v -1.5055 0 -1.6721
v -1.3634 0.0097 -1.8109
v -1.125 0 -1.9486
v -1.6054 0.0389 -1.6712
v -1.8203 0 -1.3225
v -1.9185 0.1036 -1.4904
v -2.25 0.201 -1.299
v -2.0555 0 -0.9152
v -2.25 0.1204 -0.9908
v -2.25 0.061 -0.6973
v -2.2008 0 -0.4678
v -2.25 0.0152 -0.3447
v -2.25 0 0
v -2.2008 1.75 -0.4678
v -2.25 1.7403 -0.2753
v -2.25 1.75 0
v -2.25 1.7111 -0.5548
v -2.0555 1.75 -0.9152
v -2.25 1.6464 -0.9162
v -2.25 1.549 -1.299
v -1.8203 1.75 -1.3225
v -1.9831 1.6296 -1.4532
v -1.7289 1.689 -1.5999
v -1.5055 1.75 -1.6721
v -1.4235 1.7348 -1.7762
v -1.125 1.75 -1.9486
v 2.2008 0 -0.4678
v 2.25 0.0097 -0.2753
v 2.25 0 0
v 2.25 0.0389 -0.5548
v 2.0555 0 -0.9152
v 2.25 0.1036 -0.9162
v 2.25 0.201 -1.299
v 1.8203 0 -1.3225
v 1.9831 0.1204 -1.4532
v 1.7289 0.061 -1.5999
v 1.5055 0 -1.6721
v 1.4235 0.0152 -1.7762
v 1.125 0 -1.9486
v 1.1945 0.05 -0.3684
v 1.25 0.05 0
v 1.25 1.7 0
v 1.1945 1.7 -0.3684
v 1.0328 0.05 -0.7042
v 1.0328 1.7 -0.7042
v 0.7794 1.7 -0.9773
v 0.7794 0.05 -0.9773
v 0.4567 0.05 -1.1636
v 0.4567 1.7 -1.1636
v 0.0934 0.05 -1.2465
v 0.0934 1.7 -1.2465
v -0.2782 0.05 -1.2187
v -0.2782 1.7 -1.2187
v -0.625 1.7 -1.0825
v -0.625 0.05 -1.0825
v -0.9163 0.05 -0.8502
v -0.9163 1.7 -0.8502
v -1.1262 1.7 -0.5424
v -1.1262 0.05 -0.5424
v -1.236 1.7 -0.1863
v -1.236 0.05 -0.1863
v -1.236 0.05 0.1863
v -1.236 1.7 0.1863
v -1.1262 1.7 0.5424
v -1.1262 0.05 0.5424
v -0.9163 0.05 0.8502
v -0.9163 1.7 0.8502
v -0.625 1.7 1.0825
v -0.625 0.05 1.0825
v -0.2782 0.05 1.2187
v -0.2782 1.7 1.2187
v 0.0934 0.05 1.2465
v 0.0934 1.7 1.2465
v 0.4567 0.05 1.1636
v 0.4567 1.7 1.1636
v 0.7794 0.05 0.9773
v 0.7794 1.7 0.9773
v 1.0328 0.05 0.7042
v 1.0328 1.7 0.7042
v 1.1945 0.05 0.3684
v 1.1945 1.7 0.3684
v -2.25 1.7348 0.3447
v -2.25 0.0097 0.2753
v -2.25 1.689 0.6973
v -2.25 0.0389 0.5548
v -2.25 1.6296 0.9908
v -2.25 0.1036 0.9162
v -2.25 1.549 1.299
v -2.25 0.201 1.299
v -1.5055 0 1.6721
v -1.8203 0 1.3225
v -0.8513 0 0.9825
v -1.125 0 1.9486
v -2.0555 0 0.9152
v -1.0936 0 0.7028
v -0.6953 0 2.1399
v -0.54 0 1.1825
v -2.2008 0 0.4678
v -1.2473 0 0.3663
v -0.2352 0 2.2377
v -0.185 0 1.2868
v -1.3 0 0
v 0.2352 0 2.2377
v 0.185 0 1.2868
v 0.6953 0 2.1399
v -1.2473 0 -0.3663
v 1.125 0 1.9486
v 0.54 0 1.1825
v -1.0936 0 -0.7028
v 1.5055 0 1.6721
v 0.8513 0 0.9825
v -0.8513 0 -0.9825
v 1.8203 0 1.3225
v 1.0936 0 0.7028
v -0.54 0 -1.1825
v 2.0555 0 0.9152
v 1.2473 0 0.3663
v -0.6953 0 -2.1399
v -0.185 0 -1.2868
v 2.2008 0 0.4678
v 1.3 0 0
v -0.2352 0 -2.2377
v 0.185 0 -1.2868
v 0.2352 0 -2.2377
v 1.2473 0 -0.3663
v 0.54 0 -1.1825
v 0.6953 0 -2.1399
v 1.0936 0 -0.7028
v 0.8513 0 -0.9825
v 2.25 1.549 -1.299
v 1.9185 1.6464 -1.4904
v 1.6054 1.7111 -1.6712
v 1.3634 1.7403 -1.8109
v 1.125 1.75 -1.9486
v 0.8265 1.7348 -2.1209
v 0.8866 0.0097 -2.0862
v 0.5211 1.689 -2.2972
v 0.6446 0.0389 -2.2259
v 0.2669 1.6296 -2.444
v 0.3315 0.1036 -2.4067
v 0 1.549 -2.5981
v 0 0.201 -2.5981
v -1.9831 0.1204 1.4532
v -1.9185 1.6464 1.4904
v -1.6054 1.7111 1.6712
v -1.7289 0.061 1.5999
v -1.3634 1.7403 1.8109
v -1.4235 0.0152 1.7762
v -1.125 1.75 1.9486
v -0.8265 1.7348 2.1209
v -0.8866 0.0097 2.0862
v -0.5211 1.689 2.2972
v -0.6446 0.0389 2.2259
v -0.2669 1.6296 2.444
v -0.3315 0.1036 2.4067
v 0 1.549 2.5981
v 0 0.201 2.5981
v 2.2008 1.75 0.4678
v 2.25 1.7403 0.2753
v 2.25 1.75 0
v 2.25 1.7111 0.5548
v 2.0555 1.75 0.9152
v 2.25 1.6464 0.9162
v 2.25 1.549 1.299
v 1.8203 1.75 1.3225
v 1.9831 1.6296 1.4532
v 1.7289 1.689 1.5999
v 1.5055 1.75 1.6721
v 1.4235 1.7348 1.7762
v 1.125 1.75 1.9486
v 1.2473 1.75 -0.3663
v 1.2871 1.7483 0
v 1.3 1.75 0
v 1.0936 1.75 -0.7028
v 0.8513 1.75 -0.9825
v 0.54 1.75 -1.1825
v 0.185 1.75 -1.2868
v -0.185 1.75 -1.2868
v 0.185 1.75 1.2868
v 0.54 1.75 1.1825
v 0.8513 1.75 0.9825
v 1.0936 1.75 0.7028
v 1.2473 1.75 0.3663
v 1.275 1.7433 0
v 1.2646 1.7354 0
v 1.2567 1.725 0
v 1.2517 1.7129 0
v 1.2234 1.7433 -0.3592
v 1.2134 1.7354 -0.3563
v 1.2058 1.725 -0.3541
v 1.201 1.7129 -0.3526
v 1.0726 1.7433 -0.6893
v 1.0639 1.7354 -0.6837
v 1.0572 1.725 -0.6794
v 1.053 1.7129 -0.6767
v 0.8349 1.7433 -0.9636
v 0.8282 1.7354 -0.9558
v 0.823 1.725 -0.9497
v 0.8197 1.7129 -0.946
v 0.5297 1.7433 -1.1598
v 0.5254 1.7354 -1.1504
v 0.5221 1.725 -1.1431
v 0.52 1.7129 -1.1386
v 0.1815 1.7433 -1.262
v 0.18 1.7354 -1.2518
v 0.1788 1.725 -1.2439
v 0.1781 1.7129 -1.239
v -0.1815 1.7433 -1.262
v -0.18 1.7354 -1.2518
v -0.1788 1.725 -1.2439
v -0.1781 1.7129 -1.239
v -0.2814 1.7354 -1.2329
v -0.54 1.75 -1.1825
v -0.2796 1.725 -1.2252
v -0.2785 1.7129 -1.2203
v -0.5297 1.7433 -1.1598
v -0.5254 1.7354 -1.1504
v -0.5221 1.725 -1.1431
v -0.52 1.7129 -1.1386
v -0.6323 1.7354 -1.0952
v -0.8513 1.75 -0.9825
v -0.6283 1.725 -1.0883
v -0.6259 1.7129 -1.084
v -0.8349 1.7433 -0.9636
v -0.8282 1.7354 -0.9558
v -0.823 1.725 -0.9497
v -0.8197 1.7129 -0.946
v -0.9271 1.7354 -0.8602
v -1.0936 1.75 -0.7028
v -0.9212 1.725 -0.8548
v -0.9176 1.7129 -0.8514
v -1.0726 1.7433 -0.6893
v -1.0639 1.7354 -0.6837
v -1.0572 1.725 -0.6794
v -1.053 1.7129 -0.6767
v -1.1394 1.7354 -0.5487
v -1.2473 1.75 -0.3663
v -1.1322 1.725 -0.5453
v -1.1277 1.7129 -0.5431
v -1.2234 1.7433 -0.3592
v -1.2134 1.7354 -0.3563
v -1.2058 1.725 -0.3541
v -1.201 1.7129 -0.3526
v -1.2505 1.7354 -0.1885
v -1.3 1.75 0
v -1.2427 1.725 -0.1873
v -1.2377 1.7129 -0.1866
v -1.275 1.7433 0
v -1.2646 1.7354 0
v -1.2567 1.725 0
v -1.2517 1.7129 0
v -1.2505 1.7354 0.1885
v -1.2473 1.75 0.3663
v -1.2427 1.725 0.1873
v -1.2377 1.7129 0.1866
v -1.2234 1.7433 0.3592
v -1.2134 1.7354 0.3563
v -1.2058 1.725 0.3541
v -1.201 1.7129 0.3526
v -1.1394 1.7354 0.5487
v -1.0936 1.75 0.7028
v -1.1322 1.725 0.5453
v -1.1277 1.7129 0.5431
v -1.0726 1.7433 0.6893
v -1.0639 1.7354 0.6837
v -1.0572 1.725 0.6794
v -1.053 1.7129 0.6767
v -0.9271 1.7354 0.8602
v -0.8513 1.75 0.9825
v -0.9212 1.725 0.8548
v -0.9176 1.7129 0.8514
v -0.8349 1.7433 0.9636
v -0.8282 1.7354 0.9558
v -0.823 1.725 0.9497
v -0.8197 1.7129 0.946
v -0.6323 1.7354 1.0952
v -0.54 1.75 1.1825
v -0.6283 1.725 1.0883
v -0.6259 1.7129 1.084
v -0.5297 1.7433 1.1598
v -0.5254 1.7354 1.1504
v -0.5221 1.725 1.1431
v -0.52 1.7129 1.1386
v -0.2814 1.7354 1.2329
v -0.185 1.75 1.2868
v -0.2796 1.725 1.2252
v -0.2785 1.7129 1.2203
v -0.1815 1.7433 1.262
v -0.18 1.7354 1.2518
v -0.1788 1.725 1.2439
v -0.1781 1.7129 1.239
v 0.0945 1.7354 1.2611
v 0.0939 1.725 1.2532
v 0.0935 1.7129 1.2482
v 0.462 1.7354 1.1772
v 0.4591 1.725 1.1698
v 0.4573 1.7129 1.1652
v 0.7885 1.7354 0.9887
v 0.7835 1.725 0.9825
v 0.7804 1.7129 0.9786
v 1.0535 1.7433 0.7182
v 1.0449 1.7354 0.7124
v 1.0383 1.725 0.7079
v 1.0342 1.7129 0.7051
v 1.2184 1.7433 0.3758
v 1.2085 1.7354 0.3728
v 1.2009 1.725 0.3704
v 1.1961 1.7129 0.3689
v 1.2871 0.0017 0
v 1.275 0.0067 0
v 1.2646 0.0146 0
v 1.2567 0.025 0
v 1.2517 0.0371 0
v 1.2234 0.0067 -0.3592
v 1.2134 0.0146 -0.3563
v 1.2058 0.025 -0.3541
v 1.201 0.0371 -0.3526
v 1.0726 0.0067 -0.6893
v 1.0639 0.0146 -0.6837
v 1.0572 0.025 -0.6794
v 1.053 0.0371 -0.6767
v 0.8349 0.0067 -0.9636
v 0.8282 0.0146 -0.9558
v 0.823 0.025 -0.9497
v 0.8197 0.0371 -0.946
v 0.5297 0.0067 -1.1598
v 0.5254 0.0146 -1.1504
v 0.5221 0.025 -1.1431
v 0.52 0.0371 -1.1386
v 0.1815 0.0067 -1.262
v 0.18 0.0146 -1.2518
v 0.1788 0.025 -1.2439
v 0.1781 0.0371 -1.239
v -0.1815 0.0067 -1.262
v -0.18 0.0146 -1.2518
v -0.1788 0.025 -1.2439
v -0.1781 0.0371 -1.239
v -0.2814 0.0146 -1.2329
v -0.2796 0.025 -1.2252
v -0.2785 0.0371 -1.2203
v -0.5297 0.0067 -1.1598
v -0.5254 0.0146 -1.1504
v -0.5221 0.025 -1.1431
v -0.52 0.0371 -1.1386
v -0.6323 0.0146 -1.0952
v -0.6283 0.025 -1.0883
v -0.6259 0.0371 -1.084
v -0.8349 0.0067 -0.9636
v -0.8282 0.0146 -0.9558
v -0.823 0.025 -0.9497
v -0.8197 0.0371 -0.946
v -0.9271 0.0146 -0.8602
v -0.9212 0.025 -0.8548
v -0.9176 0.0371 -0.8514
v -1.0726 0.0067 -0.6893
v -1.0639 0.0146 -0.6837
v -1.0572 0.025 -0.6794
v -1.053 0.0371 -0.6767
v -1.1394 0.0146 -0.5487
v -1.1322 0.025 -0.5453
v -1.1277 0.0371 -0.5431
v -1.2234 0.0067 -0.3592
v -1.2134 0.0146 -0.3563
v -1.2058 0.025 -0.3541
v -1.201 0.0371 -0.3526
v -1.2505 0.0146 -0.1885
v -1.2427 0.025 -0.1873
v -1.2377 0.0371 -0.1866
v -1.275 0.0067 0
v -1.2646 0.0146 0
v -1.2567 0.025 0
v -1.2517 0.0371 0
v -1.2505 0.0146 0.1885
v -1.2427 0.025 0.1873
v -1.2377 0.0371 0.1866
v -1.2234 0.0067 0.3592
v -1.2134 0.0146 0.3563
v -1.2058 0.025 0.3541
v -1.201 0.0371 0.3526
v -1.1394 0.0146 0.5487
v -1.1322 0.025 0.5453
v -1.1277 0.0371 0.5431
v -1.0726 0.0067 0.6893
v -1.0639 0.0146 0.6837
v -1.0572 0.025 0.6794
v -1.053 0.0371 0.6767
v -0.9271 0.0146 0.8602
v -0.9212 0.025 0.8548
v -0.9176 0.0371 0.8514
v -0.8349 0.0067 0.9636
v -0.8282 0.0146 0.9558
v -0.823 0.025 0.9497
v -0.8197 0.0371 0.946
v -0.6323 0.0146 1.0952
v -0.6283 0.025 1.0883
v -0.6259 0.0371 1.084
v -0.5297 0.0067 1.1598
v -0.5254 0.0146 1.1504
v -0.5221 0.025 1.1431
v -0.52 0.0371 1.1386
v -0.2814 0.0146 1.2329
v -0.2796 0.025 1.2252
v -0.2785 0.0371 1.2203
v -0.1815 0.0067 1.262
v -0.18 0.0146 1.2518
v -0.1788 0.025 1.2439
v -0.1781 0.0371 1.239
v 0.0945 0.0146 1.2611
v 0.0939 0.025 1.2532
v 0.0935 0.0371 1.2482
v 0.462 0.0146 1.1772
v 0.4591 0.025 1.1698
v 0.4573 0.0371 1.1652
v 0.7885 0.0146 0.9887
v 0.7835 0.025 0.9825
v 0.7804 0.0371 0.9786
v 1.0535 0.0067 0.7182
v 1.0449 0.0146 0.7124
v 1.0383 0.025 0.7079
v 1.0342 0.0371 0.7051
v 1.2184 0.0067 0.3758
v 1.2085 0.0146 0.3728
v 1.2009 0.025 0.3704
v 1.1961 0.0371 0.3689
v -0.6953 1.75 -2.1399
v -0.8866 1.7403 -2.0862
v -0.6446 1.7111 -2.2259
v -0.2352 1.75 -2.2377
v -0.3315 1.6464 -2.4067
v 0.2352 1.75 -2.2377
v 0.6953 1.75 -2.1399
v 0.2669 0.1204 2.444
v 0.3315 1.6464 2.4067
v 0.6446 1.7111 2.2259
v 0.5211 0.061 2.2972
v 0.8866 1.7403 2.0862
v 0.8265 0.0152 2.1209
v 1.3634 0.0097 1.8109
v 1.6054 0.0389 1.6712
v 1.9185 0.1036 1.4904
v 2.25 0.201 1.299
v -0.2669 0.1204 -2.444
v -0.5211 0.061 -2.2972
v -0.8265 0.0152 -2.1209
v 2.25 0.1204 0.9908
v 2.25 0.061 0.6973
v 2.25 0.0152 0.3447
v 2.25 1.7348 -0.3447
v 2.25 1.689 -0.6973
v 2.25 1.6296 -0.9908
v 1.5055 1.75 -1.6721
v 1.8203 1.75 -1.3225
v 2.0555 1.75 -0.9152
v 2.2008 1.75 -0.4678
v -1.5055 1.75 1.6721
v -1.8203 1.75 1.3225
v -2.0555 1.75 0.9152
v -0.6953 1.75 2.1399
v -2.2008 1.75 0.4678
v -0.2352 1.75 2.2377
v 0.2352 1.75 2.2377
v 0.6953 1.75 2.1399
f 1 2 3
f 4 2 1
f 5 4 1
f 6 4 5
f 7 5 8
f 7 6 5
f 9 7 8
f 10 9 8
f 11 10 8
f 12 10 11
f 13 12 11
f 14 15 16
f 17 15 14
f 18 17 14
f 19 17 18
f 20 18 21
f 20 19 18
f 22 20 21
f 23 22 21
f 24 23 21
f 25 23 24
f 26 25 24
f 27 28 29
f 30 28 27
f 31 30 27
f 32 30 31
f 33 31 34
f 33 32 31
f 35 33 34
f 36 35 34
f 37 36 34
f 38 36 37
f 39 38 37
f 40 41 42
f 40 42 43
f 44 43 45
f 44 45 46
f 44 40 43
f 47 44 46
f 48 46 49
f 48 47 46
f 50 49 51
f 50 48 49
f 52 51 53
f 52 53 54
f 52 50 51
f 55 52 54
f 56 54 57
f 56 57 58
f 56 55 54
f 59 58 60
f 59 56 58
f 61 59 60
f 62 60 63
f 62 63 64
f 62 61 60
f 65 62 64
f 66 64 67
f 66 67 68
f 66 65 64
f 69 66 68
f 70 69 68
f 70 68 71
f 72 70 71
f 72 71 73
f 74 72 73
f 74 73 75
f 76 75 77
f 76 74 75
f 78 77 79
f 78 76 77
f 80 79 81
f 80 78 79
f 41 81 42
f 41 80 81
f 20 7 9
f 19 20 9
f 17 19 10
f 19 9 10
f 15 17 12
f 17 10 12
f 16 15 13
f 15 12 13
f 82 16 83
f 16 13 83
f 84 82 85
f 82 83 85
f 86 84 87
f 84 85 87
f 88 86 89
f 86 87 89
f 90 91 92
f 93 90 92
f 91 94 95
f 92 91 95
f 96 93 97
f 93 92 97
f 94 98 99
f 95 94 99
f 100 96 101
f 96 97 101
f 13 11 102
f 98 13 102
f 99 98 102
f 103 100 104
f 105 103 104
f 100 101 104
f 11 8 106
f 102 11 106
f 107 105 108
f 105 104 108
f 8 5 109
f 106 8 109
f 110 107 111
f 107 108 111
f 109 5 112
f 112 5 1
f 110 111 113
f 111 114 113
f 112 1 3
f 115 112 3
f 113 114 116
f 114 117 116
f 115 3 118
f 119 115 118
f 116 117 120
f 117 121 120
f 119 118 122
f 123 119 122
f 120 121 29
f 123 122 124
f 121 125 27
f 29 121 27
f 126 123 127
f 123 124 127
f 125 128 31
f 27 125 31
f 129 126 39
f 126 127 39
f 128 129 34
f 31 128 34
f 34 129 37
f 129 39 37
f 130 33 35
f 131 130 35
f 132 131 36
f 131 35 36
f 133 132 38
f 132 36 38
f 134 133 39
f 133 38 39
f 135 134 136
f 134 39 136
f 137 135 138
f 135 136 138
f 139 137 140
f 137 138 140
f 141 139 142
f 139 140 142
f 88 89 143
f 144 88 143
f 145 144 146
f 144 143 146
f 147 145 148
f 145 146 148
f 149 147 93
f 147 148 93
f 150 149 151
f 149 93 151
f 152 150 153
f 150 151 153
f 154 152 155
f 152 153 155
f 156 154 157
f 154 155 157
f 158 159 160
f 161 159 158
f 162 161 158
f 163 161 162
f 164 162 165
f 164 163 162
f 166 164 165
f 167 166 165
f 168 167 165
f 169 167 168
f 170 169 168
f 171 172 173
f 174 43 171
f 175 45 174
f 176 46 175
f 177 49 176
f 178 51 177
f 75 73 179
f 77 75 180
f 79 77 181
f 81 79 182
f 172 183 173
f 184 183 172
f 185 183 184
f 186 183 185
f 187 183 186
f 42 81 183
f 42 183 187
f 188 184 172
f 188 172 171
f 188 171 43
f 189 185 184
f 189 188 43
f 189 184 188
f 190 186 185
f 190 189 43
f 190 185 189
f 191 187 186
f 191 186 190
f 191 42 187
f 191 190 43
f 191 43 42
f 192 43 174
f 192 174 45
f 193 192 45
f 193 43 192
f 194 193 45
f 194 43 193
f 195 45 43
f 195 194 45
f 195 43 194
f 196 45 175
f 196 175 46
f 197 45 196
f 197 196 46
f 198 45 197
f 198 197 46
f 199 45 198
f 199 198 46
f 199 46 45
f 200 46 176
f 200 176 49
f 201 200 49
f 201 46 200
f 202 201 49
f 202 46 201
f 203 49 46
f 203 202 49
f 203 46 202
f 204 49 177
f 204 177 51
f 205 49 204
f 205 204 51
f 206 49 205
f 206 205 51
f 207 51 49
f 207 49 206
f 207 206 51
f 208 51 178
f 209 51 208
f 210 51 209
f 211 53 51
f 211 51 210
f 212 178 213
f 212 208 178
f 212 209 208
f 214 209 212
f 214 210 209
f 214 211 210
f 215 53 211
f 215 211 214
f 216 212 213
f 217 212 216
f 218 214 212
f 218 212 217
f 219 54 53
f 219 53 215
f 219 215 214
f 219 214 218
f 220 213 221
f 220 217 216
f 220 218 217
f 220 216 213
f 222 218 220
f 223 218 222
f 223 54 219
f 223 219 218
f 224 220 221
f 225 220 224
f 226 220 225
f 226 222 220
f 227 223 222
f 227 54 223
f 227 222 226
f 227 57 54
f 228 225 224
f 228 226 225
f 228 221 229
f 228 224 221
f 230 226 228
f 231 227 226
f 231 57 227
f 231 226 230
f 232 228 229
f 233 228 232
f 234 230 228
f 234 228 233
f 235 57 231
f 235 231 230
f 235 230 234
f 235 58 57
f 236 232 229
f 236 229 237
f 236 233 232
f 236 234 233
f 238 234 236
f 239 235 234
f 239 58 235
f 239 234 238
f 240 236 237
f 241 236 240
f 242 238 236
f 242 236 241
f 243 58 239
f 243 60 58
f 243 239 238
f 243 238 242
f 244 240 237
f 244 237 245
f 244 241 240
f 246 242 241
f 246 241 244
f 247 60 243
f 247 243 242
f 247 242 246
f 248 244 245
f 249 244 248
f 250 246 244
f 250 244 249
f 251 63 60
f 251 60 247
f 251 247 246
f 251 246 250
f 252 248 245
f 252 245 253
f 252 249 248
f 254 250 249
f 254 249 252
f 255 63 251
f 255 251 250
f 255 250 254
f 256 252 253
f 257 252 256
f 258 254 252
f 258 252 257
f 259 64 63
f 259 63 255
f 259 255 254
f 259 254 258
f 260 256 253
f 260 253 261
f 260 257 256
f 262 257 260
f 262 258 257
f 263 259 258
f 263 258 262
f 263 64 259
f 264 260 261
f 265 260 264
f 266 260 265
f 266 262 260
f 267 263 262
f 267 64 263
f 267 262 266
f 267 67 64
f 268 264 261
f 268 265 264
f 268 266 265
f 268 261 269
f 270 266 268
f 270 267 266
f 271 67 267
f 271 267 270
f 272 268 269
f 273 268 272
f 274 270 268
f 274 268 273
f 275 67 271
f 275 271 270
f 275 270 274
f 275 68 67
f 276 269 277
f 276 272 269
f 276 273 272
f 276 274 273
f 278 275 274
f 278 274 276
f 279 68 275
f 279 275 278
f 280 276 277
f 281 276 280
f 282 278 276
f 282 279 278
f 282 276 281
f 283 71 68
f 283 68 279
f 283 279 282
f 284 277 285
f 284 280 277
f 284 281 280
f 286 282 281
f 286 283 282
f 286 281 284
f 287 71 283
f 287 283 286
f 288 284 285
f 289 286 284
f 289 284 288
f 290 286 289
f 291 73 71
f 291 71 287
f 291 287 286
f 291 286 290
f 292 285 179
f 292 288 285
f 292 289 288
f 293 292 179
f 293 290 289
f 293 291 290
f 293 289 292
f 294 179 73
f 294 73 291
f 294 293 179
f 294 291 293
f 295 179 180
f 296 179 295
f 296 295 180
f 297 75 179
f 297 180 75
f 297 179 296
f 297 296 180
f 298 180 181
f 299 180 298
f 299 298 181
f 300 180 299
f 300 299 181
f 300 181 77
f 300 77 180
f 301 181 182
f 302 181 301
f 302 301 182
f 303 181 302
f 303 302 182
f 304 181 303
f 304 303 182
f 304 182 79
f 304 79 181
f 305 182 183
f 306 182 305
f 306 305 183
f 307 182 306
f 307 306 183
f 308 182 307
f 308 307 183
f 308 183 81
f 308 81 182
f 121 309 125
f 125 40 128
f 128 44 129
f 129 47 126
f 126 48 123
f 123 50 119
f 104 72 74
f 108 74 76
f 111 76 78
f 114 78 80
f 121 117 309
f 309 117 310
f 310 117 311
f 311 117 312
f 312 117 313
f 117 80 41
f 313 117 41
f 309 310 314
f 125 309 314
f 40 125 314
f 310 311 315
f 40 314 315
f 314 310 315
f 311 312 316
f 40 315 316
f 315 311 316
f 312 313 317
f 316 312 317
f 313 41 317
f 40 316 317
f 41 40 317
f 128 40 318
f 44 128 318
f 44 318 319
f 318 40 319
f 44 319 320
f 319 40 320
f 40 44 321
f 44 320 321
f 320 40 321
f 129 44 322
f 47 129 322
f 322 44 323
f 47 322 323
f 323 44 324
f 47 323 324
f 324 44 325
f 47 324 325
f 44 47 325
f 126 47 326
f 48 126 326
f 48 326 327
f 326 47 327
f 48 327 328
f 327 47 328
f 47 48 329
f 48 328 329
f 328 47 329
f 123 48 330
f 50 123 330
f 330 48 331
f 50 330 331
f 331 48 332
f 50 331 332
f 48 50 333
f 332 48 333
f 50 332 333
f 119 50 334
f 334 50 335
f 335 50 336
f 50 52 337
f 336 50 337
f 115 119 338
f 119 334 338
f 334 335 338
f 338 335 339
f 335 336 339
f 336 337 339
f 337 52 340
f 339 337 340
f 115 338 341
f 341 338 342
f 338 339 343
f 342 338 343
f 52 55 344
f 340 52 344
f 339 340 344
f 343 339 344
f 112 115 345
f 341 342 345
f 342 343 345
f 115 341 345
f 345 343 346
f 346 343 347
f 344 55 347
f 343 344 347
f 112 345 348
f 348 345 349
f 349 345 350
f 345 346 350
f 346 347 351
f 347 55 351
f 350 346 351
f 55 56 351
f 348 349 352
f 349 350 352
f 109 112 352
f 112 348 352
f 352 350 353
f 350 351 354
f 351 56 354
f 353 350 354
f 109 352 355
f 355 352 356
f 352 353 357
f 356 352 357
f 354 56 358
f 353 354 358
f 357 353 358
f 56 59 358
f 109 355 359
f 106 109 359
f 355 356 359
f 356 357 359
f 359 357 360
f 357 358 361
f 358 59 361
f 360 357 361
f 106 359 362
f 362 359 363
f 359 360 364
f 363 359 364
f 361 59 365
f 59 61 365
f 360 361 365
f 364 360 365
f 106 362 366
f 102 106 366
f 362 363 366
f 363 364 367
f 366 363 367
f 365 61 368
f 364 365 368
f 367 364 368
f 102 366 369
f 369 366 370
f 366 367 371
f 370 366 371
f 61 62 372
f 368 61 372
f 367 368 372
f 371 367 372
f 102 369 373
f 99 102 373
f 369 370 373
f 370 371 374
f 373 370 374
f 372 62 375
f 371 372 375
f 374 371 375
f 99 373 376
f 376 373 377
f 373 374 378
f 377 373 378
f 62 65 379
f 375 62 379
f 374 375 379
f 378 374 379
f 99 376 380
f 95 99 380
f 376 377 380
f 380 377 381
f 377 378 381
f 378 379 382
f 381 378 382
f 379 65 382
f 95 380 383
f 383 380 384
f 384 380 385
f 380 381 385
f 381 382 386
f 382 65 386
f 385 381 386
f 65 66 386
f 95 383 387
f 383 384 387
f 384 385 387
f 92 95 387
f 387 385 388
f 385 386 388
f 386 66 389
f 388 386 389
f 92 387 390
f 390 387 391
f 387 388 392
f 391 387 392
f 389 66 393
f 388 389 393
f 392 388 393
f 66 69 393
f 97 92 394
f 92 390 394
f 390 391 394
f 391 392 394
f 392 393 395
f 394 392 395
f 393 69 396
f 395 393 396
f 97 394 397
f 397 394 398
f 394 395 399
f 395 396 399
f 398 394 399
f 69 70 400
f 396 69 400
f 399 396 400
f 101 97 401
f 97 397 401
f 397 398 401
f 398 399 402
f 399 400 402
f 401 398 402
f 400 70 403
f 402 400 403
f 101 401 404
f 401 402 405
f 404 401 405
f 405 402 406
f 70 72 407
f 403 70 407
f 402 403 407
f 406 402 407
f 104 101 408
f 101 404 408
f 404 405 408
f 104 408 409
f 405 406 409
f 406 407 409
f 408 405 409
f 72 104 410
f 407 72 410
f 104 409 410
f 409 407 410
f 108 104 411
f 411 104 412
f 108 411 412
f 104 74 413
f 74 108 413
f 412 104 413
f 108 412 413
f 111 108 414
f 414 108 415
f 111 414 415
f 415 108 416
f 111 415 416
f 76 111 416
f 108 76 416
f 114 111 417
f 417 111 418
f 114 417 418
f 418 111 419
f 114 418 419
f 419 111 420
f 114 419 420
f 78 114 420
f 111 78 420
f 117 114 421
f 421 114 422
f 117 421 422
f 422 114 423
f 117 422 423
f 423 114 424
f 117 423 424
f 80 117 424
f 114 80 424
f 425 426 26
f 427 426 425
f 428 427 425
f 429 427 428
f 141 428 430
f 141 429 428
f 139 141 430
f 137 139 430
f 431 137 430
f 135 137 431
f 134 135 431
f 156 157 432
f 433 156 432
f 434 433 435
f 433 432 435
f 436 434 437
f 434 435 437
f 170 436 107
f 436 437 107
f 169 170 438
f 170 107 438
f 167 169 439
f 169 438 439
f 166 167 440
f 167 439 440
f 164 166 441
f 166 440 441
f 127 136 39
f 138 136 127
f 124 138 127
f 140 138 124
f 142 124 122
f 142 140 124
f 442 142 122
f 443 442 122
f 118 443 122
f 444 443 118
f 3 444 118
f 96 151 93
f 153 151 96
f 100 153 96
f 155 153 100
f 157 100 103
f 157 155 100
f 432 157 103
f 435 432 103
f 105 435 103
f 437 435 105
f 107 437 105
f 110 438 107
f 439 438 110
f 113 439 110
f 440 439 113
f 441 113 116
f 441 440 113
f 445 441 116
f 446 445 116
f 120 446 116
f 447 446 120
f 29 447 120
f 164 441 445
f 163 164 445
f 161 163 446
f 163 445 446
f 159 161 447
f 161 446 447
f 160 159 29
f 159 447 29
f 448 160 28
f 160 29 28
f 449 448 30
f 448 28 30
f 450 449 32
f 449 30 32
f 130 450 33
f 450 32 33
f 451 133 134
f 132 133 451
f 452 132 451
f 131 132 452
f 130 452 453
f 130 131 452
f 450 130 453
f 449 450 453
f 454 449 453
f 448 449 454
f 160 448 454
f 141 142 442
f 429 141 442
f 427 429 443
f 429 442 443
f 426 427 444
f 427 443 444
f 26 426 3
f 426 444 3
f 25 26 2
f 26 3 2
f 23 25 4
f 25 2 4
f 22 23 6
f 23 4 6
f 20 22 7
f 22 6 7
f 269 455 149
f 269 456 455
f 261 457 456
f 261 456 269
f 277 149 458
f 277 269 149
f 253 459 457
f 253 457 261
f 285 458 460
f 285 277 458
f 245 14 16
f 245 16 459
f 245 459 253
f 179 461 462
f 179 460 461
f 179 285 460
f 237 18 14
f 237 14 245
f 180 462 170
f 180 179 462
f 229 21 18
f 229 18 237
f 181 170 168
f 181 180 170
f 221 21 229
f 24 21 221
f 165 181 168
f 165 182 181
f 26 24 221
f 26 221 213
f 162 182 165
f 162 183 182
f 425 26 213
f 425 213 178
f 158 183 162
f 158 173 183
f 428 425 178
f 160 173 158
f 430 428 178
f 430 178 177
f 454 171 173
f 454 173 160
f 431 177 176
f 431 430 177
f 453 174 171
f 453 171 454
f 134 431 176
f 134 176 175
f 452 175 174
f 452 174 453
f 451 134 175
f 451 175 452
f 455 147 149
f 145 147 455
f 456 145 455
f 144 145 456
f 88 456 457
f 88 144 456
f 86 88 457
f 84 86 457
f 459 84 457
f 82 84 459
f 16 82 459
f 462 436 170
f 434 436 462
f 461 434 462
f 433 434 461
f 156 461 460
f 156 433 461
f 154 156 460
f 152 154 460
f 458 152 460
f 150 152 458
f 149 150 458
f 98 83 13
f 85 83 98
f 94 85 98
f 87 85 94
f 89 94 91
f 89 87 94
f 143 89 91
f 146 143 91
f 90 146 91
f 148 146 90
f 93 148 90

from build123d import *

# Parameters (mm, degrees)
SKETCH2_R           = 1.25
BOSS_EXTRUDE1_DEPTH = 1.75
SKETCH3_OUTSIDE_W   = 14.846
SKETCH3_OUTSIDE_H   = 15.542
SKETCH3_OUTSIDE_R   = 2.25
CUT_EXTRUDE1_DEPTH  = 2
CUT_EXTRUDE1_TAPER  = 60
SKETCH4_OUTSIDE_W   = 14.846
SKETCH4_OUTSIDE_H   = 15.542
SKETCH4_OUTSIDE_R   = 2.25
CUT_EXTRUDE2_DEPTH  = 2
CUT_EXTRUDE2_TAPER  = 60
FILLET1_R           = 0.05


with BuildPart() as part:
    # Sketch2 → Boss-Extrude1 (new body)
    with BuildSketch(Plane(origin=(0, 0, 0), x_dir=(1, 0, 0), z_dir=(0, 1, 0))):
        Polygon((2.25, -1.299038106), (2.25, 1.299038106), (0, 2.598076211), (-2.25, 1.299038106), (-2.25, -1.299038106), (0, -2.598076211), align=None)
        Circle(SKETCH2_R, mode=Mode.SUBTRACT)
    extrude(amount=BOSS_EXTRUDE1_DEPTH)

    # Sketch3 outside → Cut-Extrude1 (cut)
    with BuildSketch(Plane(origin=(0, 1.75, 0), x_dir=(1, 0, 0), z_dir=(0, 1, 0))):
        Rectangle(SKETCH3_OUTSIDE_W, SKETCH3_OUTSIDE_H)
        Circle(SKETCH3_OUTSIDE_R, mode=Mode.SUBTRACT)
    extrude(amount=-CUT_EXTRUDE1_DEPTH, taper=CUT_EXTRUDE1_TAPER, mode=Mode.SUBTRACT)

    # Sketch4 outside → Cut-Extrude2 (cut)
    with BuildSketch(Plane.XZ):
        Rectangle(SKETCH4_OUTSIDE_W, SKETCH4_OUTSIDE_H)
        Circle(SKETCH4_OUTSIDE_R, mode=Mode.SUBTRACT)
    extrude(amount=-CUT_EXTRUDE2_DEPTH, taper=CUT_EXTRUDE2_TAPER, mode=Mode.SUBTRACT)

    # Fillet1
    fillet1_edges = [part.edges().sort_by_distance(p)[0] for p in [
        (-1.25, 0, 0),
        (-1.25, 1.75, 0),
    ]]
    fillet(fillet1_edges, radius=FILLET1_R)


solid = part.part
